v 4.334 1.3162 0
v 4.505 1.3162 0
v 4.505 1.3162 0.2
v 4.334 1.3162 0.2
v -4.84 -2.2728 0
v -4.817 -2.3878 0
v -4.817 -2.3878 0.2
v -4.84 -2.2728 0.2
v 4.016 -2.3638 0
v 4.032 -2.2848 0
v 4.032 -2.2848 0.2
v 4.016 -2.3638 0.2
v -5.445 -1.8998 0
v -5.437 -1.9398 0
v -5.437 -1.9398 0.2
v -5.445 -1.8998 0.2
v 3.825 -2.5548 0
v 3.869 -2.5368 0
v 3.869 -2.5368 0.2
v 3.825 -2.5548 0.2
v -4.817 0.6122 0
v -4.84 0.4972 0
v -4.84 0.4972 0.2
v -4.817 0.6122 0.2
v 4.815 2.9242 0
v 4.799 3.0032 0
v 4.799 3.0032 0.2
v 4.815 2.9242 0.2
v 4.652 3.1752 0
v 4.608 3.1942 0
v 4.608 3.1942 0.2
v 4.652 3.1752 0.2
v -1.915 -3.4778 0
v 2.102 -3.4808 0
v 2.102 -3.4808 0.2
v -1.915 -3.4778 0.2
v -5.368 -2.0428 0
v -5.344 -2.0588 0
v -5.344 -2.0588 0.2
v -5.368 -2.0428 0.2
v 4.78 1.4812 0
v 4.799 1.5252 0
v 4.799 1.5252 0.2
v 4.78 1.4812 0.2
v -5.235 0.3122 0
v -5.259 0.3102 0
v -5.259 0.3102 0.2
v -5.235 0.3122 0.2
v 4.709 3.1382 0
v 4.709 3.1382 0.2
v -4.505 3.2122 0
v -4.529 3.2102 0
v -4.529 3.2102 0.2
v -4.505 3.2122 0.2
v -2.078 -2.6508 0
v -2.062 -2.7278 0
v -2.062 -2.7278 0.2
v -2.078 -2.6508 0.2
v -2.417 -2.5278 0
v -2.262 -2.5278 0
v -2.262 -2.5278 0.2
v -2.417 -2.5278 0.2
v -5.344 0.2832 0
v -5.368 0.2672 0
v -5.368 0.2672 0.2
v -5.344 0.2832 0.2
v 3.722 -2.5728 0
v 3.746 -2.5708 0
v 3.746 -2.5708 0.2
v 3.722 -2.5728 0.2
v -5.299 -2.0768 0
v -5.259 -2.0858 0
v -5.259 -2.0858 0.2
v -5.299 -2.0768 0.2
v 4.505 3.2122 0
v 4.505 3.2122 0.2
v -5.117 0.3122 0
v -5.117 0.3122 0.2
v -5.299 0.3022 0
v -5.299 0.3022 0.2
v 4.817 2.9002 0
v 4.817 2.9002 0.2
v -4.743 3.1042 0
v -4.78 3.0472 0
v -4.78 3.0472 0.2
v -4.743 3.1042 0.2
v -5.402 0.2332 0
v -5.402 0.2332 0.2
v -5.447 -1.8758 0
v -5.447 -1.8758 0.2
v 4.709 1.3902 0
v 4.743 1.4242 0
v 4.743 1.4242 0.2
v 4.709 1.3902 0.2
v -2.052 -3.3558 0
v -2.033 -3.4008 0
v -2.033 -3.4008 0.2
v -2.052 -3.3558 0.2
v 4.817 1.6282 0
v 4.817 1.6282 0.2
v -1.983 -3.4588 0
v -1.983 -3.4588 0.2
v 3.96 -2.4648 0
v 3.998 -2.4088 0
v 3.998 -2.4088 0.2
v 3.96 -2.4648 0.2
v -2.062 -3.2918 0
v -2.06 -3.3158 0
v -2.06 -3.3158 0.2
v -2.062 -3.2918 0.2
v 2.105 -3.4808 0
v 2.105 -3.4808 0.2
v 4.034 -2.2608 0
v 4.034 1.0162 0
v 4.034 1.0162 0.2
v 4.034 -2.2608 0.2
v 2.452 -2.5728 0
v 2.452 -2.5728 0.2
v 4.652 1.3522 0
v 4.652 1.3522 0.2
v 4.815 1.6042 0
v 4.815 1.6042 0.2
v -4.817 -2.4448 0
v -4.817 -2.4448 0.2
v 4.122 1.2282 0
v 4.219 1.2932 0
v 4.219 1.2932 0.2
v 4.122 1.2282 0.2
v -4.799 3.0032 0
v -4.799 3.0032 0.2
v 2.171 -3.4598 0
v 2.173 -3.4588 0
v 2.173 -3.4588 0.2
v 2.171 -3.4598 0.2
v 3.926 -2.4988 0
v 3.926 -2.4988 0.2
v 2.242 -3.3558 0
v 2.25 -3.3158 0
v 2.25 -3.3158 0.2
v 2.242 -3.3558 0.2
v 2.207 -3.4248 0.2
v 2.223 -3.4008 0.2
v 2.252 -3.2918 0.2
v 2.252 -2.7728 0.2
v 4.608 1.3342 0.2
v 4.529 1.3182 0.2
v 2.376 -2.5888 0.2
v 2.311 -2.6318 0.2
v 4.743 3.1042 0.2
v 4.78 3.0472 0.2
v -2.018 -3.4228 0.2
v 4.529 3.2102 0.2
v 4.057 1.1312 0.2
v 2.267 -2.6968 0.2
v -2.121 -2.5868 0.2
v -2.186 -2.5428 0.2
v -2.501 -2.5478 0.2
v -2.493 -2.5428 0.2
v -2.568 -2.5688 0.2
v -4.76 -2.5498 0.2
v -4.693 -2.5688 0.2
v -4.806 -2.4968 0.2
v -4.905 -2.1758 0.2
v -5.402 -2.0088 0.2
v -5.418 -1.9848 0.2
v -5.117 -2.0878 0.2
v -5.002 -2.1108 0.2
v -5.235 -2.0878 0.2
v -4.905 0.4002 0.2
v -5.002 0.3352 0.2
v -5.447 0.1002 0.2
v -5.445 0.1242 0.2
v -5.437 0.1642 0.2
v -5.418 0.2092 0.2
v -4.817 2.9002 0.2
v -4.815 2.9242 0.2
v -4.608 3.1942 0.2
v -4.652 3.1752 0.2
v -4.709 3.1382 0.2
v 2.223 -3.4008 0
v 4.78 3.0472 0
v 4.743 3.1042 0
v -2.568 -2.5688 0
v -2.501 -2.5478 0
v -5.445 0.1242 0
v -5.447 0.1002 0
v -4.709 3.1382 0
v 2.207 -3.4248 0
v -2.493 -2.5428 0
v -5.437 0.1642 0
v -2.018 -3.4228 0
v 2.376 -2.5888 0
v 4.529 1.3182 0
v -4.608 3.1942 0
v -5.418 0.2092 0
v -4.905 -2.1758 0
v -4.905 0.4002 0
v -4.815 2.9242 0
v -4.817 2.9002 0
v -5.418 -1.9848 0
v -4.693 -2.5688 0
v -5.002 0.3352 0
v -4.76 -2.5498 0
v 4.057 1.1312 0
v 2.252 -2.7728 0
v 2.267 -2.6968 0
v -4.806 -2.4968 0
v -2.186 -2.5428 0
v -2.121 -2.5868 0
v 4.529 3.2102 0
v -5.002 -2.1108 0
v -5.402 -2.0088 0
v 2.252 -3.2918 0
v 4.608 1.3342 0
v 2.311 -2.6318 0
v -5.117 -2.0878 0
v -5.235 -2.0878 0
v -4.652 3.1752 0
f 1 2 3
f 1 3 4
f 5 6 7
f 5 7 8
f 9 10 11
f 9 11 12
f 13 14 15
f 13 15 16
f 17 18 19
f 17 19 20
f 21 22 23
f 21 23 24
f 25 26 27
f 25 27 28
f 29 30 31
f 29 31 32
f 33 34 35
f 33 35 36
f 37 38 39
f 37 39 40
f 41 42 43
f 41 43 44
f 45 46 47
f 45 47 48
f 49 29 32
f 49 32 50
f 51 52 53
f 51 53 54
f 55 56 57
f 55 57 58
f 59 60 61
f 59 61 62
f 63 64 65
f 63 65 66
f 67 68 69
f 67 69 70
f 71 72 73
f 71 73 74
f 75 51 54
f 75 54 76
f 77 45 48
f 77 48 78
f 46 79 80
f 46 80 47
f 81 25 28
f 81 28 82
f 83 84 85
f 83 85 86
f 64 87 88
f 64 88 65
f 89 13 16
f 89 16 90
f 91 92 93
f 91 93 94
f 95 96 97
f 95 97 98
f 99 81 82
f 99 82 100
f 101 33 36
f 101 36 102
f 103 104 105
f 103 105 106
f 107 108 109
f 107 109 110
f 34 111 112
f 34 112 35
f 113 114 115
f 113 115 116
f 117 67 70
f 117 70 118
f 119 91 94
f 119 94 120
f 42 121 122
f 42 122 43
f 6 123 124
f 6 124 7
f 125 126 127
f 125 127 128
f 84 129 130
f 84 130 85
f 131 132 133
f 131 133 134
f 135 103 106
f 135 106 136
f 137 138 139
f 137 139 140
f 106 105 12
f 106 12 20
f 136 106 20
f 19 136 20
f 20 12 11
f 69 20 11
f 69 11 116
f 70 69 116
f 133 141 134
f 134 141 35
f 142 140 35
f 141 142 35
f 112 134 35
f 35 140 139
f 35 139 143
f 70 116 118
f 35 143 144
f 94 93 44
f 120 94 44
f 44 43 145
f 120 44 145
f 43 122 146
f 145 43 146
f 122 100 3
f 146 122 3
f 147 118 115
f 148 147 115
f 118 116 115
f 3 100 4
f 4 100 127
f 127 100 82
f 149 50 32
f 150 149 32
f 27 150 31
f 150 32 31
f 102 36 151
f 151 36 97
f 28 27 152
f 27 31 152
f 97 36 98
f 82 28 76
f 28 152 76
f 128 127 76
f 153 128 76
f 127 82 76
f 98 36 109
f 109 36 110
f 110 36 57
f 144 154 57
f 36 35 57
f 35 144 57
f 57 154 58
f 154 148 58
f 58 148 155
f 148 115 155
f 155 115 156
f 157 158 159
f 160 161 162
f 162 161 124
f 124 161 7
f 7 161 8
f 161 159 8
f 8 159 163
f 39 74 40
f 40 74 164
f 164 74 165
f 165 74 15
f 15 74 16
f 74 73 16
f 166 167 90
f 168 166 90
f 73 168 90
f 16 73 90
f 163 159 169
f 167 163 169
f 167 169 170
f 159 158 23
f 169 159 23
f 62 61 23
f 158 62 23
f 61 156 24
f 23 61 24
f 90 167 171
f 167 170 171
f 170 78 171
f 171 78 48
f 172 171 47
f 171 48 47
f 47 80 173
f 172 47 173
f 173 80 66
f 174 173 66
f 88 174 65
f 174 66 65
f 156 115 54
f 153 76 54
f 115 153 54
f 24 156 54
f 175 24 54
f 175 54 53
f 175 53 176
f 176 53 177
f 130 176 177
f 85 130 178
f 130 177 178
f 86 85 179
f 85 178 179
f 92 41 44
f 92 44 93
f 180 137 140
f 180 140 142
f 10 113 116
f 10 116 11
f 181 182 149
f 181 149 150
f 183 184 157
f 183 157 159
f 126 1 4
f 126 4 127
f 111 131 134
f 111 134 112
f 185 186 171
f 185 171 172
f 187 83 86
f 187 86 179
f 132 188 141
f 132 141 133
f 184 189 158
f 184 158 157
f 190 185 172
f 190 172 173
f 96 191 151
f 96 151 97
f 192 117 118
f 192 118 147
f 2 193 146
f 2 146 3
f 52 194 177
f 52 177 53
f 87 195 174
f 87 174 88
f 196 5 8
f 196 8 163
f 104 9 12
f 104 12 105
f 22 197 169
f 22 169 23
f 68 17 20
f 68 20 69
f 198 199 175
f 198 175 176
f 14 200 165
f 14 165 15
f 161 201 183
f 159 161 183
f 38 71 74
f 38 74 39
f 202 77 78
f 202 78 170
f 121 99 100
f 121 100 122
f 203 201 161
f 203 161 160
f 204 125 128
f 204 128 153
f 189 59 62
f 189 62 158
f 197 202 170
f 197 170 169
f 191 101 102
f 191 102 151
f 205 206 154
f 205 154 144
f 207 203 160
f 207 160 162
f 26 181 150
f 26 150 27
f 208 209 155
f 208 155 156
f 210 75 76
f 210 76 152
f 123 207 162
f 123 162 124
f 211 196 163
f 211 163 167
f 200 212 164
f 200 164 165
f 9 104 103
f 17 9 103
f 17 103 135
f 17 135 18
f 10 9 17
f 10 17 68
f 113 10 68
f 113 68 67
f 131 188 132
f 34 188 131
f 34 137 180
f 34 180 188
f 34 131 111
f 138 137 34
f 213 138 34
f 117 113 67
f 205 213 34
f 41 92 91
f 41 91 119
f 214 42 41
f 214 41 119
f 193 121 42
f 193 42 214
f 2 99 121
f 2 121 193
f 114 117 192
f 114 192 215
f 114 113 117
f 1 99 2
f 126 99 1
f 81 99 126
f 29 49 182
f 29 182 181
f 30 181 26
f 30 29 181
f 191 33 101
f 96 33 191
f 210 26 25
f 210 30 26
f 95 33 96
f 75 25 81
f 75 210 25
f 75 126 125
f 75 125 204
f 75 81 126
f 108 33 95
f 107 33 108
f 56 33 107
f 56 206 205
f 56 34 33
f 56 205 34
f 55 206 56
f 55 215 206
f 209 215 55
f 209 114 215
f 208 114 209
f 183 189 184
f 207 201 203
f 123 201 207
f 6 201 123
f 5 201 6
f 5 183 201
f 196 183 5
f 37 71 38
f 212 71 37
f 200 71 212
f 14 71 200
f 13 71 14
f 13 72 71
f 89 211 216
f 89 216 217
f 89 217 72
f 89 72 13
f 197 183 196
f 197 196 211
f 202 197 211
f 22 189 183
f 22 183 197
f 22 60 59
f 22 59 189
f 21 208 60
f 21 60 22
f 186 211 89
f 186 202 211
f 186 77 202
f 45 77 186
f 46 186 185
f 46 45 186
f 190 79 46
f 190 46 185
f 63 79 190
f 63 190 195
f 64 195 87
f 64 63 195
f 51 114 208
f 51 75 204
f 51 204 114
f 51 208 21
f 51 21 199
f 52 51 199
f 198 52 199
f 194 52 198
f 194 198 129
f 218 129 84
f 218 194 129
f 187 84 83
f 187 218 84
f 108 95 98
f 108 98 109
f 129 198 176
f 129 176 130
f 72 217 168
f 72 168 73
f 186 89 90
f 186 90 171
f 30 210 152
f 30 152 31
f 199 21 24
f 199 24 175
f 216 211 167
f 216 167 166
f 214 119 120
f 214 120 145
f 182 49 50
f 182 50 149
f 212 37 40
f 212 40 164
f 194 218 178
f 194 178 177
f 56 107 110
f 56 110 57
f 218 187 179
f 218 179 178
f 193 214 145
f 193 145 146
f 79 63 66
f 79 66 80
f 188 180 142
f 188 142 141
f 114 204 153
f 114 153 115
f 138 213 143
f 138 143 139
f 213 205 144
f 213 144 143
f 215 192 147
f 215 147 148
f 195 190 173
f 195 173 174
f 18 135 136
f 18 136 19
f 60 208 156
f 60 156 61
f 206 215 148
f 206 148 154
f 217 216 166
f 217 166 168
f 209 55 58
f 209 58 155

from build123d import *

# Parameters (mm, degrees)
BOSS_EXTRUDE1_DEPTH   = 0.2
BOSS_EXTRUDE1_2_DEPTH = 0.2


with BuildPart() as part:
    # Model → Boss-Extrude1 (new body)
    with BuildSketch(Plane.XY):
        Polygon((16.018, -7.896828787), (16.028, -7.902828787), (21.022, -11.541828787), (21.056, -11.580828787), (21.117, -11.686828787), (21.127, -11.709828787), (21.154, -11.790828787), (21.16, -11.845828787), (21.144, -11.968828787), (21.141, -11.986828787), (21.003, -12.477828787), (21.043, -12.827828787), (21.276, -13.254828787), (21.287, -13.282828787), (21.389, -13.673828787), (21.393, -13.702828787), (21.403, -14.128828787), (21.398, -14.165828787), (21.149, -15.015828787), (21.13, -15.055828787), (20.651, -15.696828787), (20.633, -15.716828787), (20.156, -16.126828787), (20.128, -16.144828787), (19.728, -16.335828787), (19.675, -16.347828787), (19.159, -16.347828787), (19.109, -16.337828787), (18.603, -16.117828787), (18.343, -16.037828787), (17.933, -16.107828787), (17.614, -16.474828787), (17.589, -16.496828787), (16.94, -16.929828787), (16.881, -16.950828787), (14.746, -17.127828787), (14.74, -17.127828787), (10.11, -17.127828787), (10.077, -17.122828787), (9.594, -16.986828787), (9.54, -16.954828787), (8.923, -16.337828787), (8.738, -16.337828787), (8.732, -16.335828787), (-8.046, -16.335828787), (-8.113, -16.315828787), (-8.159, -16.263828787), (-8.17, -16.211828787), (-8.17, -14.262828787), (-8.151, -14.195828787), (-8.098, -14.149828787), (-8.046, -14.138828787), (8.732, -14.138828787), (8.733, -14.137828787), (8.733, -12.396828787), (8.753, -12.329828787), (8.767, -12.311828787), (9.196, -11.856828787), (9.257, -11.821828787), (9.287, -11.817828787), (11.043, -11.817828787), (11.84, -11.212828787), (11.905, -11.187828787), (11.915, -11.187828787), (13.063, -11.187828787), (13.453, -10.907828787), (15.638, -7.967828787), (15.674, -7.934828787), (15.726, -7.903828787), (15.785, -7.886828787), (15.95, -7.879828787), align=None)
    extrude(amount=BOSS_EXTRUDE1_DEPTH)


with BuildPart() as body_2:
    # Model → Boss-Extrude1 2 (new body)
    with BuildSketch(Plane.XY):
        Polygon((4.529, 3.210171213), (4.608, 3.194171213), (4.652, 3.175171213), (4.709, 3.138171213), (4.743, 3.104171213), (4.78, 3.047171213), (4.799, 3.003171213), (4.815, 2.924171213), (4.817, 2.900171213), (4.817, 1.628171213), (4.815, 1.604171213), (4.799, 1.525171213), (4.78, 1.481171213), (4.743, 1.424171213), (4.709, 1.390171213), (4.652, 1.352171213), (4.608, 1.334171213), (4.529, 1.318171213), (4.505, 1.316171213), (4.334, 1.316171213), (4.219, 1.293171213), (4.122, 1.228171213), (4.057, 1.131171213), (4.034, 1.016171213), (4.034, -2.260828787), (4.032, -2.284828787), (4.016, -2.363828787), (3.998, -2.408828787), (3.96, -2.464828787), (3.926, -2.498828787), (3.869, -2.536828787), (3.825, -2.554828787), (3.746, -2.570828787), (3.722, -2.572828787), (2.452, -2.572828787), (2.376, -2.588828787), (2.311, -2.631828787), (2.267, -2.696828787), (2.252, -2.772828787), (2.252, -3.291828787), (2.25, -3.315828787), (2.242, -3.355828787), (2.223, -3.400828787), (2.207, -3.424828787), (2.173, -3.458828787), (2.171, -3.459828787), (2.105, -3.480828787), (2.102, -3.480828787), (-1.915, -3.477828787), (-1.983, -3.458828787), (-2.018, -3.422828787), (-2.033, -3.400828787), (-2.052, -3.355828787), (-2.06, -3.315828787), (-2.062, -3.291828787), (-2.062, -2.727828787), (-2.078, -2.650828787), (-2.121, -2.586828787), (-2.186, -2.542828787), (-2.262, -2.527828787), (-2.417, -2.527828787), (-2.493, -2.542828787), (-2.501, -2.547828787), (-2.568, -2.568828787), (-2.57, -2.568828787), (-4.693, -2.568828787), (-4.76, -2.549828787), (-4.806, -2.496828787), (-4.817, -2.444828787), (-4.817, -2.387828787), (-4.84, -2.272828787), (-4.905, -2.175828787), (-5.002, -2.110828787), (-5.117, -2.087828787), (-5.235, -2.087828787), (-5.259, -2.085828787), (-5.299, -2.076828787), (-5.344, -2.058828787), (-5.368, -2.042828787), (-5.402, -2.008828787), (-5.418, -1.984828787), (-5.437, -1.939828787), (-5.445, -1.899828787), (-5.447, -1.875828787), (-5.447, 0.100171213), (-5.445, 0.124171213), (-5.437, 0.164171213), (-5.418, 0.209171213), (-5.402, 0.233171213), (-5.368, 0.267171213), (-5.344, 0.283171213), (-5.299, 0.302171213), (-5.259, 0.310171213), (-5.235, 0.312171213), (-5.117, 0.312171213), (-5.002, 0.335171213), (-4.905, 0.400171213), (-4.84, 0.497171213), (-4.817, 0.612171213), (-4.817, 2.900171213), (-4.815, 2.924171213), (-4.799, 3.003171213), (-4.78, 3.047171213), (-4.743, 3.104171213), (-4.709, 3.138171213), (-4.652, 3.175171213), (-4.608, 3.194171213), (-4.529, 3.210171213), (-4.505, 3.212171213), (4.505, 3.212171213), align=None)
    extrude(amount=BOSS_EXTRUDE1_2_DEPTH)


solid = body_2.part
